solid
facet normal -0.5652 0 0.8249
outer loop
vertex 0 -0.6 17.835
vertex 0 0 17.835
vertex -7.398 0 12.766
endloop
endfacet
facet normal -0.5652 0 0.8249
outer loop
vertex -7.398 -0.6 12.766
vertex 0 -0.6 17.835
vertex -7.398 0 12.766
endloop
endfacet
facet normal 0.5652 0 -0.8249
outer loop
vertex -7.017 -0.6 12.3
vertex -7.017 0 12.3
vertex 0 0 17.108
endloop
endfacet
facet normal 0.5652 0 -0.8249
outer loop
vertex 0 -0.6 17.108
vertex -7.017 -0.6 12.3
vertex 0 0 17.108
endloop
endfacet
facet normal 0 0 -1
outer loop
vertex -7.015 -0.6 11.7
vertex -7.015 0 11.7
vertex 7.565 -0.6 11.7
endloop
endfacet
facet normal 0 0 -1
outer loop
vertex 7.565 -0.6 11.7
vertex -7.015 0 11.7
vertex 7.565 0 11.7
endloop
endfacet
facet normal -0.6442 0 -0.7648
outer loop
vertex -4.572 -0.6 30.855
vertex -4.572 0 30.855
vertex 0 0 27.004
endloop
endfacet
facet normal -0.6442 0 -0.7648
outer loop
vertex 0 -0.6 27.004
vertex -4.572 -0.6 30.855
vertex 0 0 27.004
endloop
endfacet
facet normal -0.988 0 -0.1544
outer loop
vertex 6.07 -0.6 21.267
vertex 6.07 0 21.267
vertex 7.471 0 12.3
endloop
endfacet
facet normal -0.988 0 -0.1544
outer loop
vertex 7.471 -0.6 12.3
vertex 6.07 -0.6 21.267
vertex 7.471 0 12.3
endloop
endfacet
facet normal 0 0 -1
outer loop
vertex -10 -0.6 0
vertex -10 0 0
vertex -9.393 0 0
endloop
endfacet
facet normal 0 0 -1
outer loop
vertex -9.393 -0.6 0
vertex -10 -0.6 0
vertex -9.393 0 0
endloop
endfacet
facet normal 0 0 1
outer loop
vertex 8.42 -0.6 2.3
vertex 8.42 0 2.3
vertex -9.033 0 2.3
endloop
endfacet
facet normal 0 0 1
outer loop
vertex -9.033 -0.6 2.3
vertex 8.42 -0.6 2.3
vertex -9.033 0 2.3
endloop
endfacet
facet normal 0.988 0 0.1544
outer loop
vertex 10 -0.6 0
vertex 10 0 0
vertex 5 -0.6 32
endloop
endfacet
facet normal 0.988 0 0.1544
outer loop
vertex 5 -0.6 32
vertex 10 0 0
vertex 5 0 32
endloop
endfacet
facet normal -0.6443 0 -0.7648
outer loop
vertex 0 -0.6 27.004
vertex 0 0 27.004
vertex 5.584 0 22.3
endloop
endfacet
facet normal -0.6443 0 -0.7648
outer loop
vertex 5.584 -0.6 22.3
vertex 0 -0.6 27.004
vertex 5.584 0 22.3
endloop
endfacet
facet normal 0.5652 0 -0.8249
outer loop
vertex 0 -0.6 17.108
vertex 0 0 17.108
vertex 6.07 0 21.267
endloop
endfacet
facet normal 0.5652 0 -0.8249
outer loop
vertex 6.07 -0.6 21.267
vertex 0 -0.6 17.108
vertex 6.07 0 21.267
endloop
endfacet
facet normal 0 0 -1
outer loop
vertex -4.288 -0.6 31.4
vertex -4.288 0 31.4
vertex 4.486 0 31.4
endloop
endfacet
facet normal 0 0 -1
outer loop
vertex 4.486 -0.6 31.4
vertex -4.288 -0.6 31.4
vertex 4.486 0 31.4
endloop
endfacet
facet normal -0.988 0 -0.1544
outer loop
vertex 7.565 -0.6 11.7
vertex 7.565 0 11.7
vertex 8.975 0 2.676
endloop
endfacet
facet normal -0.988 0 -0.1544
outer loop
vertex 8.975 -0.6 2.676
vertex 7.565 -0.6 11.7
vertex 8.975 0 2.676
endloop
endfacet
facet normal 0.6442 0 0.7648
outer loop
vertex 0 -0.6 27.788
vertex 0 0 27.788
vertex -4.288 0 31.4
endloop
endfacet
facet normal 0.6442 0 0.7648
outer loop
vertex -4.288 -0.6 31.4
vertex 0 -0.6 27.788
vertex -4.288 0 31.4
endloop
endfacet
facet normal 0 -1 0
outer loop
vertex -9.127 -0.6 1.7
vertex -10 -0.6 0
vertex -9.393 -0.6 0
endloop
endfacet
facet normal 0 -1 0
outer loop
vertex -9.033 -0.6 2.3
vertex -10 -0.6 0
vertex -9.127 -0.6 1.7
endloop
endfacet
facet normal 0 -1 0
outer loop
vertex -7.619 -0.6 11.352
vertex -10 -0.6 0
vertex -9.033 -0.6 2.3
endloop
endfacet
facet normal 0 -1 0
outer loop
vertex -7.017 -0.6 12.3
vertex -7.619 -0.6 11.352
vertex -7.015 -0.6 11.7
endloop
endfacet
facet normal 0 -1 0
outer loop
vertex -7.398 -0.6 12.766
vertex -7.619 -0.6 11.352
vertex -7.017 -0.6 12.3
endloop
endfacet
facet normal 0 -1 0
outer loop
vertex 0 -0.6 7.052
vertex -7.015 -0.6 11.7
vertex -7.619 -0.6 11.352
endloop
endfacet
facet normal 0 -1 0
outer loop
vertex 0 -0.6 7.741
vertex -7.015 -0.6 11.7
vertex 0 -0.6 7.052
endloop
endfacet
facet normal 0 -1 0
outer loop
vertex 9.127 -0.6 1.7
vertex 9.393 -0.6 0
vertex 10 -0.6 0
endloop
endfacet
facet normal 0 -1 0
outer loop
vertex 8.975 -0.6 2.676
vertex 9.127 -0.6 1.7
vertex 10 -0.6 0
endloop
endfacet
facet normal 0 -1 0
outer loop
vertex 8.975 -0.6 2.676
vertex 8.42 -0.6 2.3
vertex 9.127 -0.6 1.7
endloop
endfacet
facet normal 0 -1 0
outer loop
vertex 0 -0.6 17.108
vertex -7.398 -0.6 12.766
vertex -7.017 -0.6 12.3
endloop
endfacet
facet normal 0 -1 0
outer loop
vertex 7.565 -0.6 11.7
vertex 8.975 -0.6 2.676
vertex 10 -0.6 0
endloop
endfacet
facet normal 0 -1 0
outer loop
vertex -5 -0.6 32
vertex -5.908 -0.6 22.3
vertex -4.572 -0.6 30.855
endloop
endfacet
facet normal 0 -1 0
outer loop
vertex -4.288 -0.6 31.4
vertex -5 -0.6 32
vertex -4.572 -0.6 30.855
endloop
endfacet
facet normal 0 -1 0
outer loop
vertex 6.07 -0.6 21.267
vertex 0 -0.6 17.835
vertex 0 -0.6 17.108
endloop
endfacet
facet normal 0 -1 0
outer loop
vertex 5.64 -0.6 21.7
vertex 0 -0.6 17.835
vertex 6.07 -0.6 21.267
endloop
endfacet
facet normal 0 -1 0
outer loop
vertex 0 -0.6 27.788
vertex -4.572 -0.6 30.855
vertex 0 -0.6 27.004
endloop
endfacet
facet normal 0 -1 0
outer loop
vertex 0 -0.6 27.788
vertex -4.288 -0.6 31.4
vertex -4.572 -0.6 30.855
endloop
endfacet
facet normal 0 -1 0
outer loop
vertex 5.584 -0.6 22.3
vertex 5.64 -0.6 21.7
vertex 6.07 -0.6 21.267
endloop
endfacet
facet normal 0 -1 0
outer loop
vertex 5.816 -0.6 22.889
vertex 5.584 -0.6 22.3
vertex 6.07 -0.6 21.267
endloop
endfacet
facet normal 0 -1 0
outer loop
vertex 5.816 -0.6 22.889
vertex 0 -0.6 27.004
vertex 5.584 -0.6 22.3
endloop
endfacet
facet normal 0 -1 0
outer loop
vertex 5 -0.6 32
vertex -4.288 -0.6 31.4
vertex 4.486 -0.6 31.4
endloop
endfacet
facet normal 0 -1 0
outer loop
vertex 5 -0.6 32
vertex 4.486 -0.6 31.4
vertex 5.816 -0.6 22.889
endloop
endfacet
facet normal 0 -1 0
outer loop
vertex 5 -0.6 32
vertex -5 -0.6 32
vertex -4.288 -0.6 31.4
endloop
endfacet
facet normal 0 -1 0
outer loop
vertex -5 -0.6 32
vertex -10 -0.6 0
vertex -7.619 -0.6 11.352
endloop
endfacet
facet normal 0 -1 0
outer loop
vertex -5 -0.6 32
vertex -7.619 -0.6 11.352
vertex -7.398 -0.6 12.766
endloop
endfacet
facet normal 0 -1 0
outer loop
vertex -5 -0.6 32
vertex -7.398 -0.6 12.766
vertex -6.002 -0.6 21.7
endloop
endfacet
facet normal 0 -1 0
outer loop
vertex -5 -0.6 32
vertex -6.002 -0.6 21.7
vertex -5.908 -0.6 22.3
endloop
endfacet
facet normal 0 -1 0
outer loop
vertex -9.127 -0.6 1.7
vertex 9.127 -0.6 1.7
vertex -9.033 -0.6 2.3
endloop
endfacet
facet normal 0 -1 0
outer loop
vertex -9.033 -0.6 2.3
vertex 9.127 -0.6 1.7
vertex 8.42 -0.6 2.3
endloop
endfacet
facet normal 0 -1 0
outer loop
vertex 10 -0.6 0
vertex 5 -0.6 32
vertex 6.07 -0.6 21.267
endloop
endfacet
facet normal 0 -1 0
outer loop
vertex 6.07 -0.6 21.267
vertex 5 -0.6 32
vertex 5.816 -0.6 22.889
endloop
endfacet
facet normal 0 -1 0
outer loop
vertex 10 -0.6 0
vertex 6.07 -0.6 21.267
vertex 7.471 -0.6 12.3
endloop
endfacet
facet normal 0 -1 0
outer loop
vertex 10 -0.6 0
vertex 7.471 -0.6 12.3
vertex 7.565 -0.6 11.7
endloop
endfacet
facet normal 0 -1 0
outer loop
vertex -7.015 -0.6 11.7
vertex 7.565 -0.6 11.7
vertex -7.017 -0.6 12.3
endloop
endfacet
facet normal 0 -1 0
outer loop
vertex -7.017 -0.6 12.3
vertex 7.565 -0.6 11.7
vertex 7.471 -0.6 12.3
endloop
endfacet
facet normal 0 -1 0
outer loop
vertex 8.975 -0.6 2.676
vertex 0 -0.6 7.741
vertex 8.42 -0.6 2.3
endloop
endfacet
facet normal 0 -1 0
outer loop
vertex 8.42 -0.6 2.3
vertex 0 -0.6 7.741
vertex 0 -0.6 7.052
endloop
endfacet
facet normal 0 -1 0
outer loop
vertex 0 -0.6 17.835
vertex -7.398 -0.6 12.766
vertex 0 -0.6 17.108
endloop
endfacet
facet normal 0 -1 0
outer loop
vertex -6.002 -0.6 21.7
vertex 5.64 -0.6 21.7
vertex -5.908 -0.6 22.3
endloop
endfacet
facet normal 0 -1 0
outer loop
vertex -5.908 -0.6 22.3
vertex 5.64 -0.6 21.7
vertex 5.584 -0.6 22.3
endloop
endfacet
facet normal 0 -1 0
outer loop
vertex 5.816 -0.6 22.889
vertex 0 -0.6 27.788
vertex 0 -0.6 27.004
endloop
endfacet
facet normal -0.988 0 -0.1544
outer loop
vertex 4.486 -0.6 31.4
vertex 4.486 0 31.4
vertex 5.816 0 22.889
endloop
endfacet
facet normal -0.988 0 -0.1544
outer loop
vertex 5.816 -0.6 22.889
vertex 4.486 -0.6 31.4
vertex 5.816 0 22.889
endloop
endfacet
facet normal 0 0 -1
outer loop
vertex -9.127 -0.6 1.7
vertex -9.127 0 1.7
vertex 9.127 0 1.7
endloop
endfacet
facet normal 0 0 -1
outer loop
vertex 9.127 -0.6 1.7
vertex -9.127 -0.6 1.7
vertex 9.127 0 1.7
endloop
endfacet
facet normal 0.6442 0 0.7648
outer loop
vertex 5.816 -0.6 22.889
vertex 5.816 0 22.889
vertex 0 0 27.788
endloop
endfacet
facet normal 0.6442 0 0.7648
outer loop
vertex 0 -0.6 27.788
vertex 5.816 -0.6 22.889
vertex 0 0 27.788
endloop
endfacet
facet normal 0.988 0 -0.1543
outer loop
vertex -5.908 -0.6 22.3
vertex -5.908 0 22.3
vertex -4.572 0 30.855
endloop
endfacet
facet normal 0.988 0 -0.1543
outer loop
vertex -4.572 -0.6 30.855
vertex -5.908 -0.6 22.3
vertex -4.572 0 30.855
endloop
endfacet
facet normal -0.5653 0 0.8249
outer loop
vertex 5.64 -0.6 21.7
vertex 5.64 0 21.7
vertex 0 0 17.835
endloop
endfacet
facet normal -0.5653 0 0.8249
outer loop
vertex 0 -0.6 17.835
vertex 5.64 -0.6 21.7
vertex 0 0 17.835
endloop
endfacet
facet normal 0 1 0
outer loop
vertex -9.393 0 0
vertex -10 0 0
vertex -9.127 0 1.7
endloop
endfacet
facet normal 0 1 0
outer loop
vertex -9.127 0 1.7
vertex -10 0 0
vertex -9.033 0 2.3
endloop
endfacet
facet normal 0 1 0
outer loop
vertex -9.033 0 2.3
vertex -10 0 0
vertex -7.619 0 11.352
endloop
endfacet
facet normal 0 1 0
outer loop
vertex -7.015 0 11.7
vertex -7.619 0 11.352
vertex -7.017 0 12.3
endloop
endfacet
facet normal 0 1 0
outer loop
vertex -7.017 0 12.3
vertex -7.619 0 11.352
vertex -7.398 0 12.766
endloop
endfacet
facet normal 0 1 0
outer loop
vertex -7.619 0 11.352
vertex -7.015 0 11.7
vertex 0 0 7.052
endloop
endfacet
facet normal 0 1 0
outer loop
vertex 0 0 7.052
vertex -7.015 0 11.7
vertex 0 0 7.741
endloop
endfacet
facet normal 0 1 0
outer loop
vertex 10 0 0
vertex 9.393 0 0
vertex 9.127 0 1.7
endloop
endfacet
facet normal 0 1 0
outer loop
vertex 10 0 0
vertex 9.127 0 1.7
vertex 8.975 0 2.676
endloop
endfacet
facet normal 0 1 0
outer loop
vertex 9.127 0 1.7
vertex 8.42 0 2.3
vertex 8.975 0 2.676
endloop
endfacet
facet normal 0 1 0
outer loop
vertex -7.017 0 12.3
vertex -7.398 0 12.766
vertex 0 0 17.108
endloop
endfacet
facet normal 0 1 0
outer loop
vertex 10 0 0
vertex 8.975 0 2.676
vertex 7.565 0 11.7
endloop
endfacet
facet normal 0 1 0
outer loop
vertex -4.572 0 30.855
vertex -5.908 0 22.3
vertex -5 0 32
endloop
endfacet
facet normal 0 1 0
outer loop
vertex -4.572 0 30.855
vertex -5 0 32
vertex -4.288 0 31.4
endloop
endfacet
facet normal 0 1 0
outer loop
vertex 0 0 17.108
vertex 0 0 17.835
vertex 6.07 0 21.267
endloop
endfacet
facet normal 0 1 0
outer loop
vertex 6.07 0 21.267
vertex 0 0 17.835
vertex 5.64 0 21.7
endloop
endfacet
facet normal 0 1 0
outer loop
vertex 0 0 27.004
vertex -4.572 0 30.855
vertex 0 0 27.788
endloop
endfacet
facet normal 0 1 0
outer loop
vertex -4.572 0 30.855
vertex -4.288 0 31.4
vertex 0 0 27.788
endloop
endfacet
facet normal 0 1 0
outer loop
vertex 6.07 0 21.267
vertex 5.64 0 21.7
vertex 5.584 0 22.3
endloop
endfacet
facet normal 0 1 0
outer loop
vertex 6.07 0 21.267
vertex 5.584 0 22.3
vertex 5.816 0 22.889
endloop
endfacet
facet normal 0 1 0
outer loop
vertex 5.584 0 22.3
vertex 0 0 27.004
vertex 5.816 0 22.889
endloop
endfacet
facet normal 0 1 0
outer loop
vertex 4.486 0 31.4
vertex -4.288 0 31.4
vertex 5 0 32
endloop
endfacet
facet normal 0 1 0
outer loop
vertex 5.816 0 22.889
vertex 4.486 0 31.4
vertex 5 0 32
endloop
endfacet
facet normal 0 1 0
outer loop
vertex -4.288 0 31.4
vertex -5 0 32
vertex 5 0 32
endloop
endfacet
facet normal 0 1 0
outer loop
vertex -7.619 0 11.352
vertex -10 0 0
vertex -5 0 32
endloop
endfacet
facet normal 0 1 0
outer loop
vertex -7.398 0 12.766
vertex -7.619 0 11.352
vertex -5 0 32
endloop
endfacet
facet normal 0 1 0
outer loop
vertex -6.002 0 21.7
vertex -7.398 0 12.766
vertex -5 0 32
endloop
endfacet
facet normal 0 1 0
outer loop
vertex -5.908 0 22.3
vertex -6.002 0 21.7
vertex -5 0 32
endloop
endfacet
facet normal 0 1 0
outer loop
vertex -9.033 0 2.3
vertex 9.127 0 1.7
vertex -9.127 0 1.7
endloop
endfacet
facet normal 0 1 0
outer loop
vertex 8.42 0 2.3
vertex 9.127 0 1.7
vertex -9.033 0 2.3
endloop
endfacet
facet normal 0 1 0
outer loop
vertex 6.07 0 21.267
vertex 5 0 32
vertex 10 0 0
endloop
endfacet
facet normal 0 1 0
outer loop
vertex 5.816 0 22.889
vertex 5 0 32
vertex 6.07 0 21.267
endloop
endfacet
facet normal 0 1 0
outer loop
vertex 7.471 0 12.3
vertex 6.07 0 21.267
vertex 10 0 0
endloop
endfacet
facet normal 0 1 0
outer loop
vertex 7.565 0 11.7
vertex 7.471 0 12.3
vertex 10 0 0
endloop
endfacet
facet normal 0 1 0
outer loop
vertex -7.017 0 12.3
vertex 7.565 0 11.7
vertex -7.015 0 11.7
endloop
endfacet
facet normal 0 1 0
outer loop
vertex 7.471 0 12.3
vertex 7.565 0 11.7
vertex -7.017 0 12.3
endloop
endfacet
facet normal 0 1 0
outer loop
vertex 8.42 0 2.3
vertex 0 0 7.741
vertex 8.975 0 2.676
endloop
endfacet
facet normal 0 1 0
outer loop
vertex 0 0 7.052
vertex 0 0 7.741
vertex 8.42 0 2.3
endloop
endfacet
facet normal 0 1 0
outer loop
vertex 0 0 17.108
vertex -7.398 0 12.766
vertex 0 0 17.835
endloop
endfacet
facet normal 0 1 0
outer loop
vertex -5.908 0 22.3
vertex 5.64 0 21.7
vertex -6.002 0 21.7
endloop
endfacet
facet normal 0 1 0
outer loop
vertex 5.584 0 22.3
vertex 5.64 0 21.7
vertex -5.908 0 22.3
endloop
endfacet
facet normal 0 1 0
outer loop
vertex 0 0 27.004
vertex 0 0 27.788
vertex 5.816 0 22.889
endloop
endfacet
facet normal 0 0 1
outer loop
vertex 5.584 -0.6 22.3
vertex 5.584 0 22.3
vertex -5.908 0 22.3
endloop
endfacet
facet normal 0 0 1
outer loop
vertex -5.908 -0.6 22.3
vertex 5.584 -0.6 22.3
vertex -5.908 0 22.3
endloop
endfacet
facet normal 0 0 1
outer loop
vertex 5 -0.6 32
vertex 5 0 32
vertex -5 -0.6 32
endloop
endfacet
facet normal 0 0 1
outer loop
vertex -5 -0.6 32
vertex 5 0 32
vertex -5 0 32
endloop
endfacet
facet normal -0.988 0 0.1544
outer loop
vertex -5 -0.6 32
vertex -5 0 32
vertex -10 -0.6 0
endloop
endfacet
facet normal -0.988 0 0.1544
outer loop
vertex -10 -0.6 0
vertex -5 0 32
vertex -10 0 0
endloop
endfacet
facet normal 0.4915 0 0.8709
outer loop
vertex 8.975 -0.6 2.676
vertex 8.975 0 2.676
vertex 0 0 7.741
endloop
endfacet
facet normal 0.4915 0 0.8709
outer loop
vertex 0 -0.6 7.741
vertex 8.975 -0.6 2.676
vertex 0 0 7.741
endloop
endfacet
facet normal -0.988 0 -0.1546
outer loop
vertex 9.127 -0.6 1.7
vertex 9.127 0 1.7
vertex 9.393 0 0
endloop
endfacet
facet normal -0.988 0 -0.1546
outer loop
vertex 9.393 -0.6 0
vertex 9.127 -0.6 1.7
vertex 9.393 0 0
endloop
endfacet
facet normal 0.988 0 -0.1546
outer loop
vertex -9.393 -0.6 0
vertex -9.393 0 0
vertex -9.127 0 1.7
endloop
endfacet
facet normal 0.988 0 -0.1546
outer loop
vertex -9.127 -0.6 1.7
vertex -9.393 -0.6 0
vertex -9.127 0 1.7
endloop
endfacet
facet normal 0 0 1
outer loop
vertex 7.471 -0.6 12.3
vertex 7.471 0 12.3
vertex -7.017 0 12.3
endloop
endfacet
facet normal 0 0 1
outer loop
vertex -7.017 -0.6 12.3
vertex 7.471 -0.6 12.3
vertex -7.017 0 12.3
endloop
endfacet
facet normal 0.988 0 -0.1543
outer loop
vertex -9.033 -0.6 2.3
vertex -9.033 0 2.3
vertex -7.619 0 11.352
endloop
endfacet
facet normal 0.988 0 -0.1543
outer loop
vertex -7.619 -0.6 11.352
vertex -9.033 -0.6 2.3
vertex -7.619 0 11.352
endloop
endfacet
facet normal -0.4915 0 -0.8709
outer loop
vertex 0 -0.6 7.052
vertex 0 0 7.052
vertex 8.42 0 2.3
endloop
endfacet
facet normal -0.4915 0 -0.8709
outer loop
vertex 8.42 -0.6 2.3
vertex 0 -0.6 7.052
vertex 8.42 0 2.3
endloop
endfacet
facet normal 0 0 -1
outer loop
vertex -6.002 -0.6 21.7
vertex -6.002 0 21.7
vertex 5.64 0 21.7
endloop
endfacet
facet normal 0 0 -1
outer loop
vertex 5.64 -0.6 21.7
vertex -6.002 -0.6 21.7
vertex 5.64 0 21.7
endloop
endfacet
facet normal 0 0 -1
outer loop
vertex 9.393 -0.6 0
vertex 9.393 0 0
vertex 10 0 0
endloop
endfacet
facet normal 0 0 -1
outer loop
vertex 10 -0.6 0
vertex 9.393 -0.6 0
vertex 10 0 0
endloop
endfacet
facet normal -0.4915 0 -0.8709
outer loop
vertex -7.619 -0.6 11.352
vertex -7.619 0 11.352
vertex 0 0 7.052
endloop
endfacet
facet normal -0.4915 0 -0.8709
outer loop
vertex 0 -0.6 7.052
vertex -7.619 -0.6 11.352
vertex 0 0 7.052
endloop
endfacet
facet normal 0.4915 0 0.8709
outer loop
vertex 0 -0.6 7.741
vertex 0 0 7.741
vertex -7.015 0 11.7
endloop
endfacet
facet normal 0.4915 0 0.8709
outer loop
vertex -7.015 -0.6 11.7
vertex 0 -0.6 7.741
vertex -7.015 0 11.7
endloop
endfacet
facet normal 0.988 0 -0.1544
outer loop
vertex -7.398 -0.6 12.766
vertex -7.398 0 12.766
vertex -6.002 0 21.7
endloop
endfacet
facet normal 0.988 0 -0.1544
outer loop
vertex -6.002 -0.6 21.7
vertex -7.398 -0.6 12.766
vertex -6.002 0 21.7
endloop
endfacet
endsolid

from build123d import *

# Parameters (mm, degrees)
F1_DEPTH = 0.6


with BuildPart() as f1:
    # F0 (on Front) → F1 (new body)
    with BuildSketch(Plane.XZ):
        Polygon((-9.3927199472, 0), (-9.1270949472, 1.7), (-9.0333449472, 2.3), (-9.640625, 2.3), (-10, 0), align=None)
        Polygon((-9.640625, 2.3), (-9.0333449472, 2.3), (-7.6189836648, 11.3519122078), (-7.5645949472, 11.7), (-7.5200572692, 11.9850411396), (-8.078125, 12.3), align=None)
        Polygon((-6.515625, 22.3), (-8.078125, 12.3), (-7.3980295932, 12.7660182659), (-6.0020949472, 21.7), (-5.9083449472, 22.3), align=None)
        Polygon((-5, 32), (-6.515625, 22.3), (-5.9083449472, 22.3), (-4.5716713254, 30.8547111795), (-4.4864699472, 31.4), (-4.287693299, 31.4), align=None)
        Polygon((5.8163040642, 22.8890616512), (6.515625, 22.3), (5, 32), (0, 32), (0, 31.4), (4.4864699472, 31.4), align=None)
        Polygon((0, 32), (-5, 32), (-4.287693299, 31.4), (0, 31.4), align=None)
        Polygon((7.4708449472, 12.3), (8.078125, 12.3), (6.515625, 22.3), (5.9670760935, 21.9241206637), (6.0020949472, 21.7), (6.0697327931, 21.2671177867), align=None)
        Polygon((7.5645949472, 11.7), (8.9746138009, 2.6758793363), (9.640625, 2.3), (8.078125, 12.3), (7.4708449472, 12.3), align=None)
        Polygon((9.0333449472, 2.3), (9.1270949472, 1.7), (9.3927199472, 0), (10, 0), (9.640625, 2.3), align=None)
        Polygon((0, 2.3), (0, 1.7), (9.1270949472, 1.7), (9.0333449472, 2.3), (8.4198732785, 2.3), align=None)
        Polygon((-9.1270949472, 1.7), (0, 1.7), (0, 2.3), (-9.0333449472, 2.3), align=None)
        Polygon((0, 7.7409171076), (0, 7.0519567004), (8.4198732785, 2.3), (9.0333449472, 2.3), (8.9746138009, 2.6758793363), align=None)
        Polygon((-7.6189836648, 11.3519122078), (0, 7.0519567004), (0, 7.7409171076), (-7.015, 11.7), (-7.5645949472, 11.7), align=None)
        Polygon((0, 12.3), (0, 11.7), (7.5645949472, 11.7), (7.4708449472, 12.3), align=None)
        Polygon((-7.015, 11.7), (0, 11.7), (0, 12.3), (-7.0166547269, 12.3), (-7.4708449472, 12.3), (-7.5200572692, 11.9850411396), align=None)
        Polygon((0, 17.8353319058), (0, 17.1079861084), (6.0697327931, 21.2671177867), (6.0020949472, 21.7), (5.64, 21.7), align=None)
        Polygon((-7.3980295932, 12.7660182659), (-7.4708449472, 12.3), (-7.0166547269, 12.3), (0, 17.1079861084), (0, 17.8353319058), align=None)
        Polygon((5.5842921721, 22.3), (5.9083449472, 22.3), (5.8163040642, 22.8890616512), (0, 27.7883310719), (0, 27.0038379653), align=None)
        Polygon((0, 27.7883310719), (-4.287693299, 31.4), (-4.4864699472, 31.4), (-4.5716713254, 30.8547111795), (0, 27.0038379653), align=None)
        Polygon((5.9670760935, 21.9241206637), (5.9083449472, 22.3), (5.5842921721, 22.3), (0, 22.3), (0, 21.7), (5.64, 21.7), align=None)
        Polygon((0, 22.3), (-5.9083449472, 22.3), (-6.0020949472, 21.7), (0, 21.7), align=None)
        Polygon((5.9083449472, 22.3), (6.515625, 22.3), (5.8163040642, 22.8890616512), align=None)
        Polygon((5.9670760935, 21.9241206637), (6.515625, 22.3), (5.9083449472, 22.3), align=None)
        Polygon((6.0020949472, 21.7), (5.9670760935, 21.9241206637), (5.64, 21.7), align=None)
        Polygon((8.9746138009, 2.6758793363), (9.0333449472, 2.3), (9.640625, 2.3), align=None)
        Polygon((-7.3980295932, 12.7660182659), (-8.078125, 12.3), (-7.4708449472, 12.3), align=None)
        Polygon((-7.4708449472, 12.3), (-8.078125, 12.3), (-7.5200572692, 11.9850411396), align=None)
        Polygon((-7.5645949472, 11.7), (-7.015, 11.7), (-7.5200572692, 11.9850411396), align=None)
    extrude(amount=F1_DEPTH)


solid = f1.part
